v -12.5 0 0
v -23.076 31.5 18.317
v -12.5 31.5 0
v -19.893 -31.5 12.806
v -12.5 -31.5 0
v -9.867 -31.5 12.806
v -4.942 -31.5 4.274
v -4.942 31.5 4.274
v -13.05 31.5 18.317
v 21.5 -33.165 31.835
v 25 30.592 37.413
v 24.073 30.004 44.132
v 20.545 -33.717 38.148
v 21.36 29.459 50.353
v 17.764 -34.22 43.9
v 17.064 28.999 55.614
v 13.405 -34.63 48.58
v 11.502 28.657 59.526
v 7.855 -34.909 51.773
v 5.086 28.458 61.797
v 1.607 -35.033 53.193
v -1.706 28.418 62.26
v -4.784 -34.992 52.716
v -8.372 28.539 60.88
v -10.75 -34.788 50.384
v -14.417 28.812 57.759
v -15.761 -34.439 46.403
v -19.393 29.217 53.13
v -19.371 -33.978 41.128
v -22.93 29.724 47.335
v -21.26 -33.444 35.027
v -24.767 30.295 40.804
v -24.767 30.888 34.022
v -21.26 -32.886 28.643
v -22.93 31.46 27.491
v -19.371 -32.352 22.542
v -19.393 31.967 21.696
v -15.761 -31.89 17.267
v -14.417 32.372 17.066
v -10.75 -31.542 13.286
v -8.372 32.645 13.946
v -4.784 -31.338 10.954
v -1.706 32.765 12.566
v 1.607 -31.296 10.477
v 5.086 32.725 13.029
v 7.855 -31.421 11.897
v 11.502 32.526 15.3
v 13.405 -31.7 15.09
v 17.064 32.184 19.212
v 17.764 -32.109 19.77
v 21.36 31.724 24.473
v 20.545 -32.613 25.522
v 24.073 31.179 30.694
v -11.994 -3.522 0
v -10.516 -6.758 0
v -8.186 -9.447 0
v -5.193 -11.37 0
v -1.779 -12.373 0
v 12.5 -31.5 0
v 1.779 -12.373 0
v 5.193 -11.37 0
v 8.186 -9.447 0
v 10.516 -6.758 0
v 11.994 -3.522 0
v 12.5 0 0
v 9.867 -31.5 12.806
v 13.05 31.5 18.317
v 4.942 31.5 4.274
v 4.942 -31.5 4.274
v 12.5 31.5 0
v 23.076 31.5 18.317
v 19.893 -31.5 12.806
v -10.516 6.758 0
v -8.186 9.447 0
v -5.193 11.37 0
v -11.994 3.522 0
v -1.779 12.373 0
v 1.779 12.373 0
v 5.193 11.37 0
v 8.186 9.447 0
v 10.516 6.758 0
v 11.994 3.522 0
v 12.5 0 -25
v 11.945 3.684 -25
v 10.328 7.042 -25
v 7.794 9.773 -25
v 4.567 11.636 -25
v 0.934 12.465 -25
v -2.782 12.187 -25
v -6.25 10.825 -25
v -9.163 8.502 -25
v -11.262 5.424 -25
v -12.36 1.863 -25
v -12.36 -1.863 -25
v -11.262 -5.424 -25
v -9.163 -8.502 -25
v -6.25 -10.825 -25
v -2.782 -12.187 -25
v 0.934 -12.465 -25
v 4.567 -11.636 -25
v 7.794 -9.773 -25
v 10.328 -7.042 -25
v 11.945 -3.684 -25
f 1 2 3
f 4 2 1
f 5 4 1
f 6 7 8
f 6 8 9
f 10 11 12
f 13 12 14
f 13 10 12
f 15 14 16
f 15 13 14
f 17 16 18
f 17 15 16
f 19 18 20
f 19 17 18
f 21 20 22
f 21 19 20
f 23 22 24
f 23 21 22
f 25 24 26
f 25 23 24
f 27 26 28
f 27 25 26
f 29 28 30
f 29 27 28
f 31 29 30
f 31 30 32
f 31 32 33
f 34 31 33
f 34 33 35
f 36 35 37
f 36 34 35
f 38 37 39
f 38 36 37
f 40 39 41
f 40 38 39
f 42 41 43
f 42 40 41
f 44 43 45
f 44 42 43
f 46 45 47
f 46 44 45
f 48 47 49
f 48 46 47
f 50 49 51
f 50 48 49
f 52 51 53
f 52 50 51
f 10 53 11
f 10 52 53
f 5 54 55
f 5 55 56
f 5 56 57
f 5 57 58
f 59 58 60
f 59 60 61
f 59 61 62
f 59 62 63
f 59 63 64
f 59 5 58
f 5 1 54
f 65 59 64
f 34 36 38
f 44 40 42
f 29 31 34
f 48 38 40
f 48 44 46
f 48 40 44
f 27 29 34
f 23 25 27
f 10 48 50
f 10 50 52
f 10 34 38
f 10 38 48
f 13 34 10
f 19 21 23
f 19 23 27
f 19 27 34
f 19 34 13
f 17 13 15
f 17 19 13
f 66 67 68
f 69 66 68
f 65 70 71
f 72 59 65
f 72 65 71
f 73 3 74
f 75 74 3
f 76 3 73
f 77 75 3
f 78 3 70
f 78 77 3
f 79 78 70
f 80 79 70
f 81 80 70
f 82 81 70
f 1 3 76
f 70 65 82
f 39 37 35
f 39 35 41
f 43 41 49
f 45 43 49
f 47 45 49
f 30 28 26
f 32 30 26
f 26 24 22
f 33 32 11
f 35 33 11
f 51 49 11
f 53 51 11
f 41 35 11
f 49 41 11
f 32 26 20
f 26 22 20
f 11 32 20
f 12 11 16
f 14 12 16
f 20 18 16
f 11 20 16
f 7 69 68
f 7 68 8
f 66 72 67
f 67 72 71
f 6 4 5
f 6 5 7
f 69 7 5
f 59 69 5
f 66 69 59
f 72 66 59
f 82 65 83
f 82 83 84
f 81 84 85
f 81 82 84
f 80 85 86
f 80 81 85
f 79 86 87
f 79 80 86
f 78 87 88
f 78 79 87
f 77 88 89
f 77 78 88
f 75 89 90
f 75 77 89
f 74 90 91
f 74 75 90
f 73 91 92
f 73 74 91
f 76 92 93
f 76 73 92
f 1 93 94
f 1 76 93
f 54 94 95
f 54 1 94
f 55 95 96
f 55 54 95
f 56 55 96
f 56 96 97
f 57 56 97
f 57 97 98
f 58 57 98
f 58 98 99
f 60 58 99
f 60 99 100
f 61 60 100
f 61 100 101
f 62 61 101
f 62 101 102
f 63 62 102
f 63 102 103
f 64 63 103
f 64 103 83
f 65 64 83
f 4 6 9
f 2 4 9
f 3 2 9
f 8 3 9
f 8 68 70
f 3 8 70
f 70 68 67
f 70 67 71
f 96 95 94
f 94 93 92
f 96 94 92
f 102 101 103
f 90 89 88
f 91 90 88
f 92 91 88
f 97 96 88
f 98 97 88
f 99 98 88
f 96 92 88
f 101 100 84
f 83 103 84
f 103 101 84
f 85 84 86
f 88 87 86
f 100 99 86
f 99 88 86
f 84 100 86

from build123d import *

# Parameters (mm, degrees)
F0_R     = 12.5
F2_DEPTH = 25
F3_DEPTH = 31.5
F5_DEPTH = 50
F9_R     = 25
F7_R     = 21.5


with BuildPart() as f2:
    # F0 (on Top) → F2 (new body)
    with BuildSketch(Plane.XY):
        Circle(F0_R)
    extrude(amount=-F2_DEPTH)

    # F1 (on Front) → F3 (join, symmetric)
    with BuildSketch(Plane.XZ):
        Polygon((-12.5, 0), (12.5, 0), (23.0756080491, 18.317490462), (13.0496482004, 18.317490462), (4.9415511342, 4.2738543907), (-4.9415511342, 4.2738543907), (-13.0496482004, 18.317490462), (-23.0756080491, 18.317490462), align=None)
    extrude(amount=F3_DEPTH, both=True)

    # F4 (on Right) → F5 (cut, symmetric)
    with BuildSketch(Plane.YZ):
        Polygon((-31.5, 41.0514958203), (-31.5, 18.317490462), (-31.5, 12.8057046598), (31.5, 18.317490462), (31.5, 41.0514958203), align=None)
    extrude(amount=F5_DEPTH, both=True, mode=Mode.SUBTRACT)


with BuildPart() as f10:
    # F9 (on offset) → F10 section 0
    with BuildSketch(Plane(origin=(0, 33.6075822069, 2.9402824516), x_dir=(1, 0, 0), z_dir=(0, -0.9961946981, -0.0871557427))):
        with Locations((0, 34.6043201034)):
            Circle(F9_R)
    # F7 (on line) → F10 section 1
    with BuildSketch(Plane(origin=(0, -30.148878471, -2.6376850842), x_dir=(1, 0, 0), z_dir=(0, -0.9961946981, -0.0871557427))):
        with Locations((0, 34.6043201034)):
            Circle(F7_R)
    loft()


solid = Compound([f2.part, f10.part])
